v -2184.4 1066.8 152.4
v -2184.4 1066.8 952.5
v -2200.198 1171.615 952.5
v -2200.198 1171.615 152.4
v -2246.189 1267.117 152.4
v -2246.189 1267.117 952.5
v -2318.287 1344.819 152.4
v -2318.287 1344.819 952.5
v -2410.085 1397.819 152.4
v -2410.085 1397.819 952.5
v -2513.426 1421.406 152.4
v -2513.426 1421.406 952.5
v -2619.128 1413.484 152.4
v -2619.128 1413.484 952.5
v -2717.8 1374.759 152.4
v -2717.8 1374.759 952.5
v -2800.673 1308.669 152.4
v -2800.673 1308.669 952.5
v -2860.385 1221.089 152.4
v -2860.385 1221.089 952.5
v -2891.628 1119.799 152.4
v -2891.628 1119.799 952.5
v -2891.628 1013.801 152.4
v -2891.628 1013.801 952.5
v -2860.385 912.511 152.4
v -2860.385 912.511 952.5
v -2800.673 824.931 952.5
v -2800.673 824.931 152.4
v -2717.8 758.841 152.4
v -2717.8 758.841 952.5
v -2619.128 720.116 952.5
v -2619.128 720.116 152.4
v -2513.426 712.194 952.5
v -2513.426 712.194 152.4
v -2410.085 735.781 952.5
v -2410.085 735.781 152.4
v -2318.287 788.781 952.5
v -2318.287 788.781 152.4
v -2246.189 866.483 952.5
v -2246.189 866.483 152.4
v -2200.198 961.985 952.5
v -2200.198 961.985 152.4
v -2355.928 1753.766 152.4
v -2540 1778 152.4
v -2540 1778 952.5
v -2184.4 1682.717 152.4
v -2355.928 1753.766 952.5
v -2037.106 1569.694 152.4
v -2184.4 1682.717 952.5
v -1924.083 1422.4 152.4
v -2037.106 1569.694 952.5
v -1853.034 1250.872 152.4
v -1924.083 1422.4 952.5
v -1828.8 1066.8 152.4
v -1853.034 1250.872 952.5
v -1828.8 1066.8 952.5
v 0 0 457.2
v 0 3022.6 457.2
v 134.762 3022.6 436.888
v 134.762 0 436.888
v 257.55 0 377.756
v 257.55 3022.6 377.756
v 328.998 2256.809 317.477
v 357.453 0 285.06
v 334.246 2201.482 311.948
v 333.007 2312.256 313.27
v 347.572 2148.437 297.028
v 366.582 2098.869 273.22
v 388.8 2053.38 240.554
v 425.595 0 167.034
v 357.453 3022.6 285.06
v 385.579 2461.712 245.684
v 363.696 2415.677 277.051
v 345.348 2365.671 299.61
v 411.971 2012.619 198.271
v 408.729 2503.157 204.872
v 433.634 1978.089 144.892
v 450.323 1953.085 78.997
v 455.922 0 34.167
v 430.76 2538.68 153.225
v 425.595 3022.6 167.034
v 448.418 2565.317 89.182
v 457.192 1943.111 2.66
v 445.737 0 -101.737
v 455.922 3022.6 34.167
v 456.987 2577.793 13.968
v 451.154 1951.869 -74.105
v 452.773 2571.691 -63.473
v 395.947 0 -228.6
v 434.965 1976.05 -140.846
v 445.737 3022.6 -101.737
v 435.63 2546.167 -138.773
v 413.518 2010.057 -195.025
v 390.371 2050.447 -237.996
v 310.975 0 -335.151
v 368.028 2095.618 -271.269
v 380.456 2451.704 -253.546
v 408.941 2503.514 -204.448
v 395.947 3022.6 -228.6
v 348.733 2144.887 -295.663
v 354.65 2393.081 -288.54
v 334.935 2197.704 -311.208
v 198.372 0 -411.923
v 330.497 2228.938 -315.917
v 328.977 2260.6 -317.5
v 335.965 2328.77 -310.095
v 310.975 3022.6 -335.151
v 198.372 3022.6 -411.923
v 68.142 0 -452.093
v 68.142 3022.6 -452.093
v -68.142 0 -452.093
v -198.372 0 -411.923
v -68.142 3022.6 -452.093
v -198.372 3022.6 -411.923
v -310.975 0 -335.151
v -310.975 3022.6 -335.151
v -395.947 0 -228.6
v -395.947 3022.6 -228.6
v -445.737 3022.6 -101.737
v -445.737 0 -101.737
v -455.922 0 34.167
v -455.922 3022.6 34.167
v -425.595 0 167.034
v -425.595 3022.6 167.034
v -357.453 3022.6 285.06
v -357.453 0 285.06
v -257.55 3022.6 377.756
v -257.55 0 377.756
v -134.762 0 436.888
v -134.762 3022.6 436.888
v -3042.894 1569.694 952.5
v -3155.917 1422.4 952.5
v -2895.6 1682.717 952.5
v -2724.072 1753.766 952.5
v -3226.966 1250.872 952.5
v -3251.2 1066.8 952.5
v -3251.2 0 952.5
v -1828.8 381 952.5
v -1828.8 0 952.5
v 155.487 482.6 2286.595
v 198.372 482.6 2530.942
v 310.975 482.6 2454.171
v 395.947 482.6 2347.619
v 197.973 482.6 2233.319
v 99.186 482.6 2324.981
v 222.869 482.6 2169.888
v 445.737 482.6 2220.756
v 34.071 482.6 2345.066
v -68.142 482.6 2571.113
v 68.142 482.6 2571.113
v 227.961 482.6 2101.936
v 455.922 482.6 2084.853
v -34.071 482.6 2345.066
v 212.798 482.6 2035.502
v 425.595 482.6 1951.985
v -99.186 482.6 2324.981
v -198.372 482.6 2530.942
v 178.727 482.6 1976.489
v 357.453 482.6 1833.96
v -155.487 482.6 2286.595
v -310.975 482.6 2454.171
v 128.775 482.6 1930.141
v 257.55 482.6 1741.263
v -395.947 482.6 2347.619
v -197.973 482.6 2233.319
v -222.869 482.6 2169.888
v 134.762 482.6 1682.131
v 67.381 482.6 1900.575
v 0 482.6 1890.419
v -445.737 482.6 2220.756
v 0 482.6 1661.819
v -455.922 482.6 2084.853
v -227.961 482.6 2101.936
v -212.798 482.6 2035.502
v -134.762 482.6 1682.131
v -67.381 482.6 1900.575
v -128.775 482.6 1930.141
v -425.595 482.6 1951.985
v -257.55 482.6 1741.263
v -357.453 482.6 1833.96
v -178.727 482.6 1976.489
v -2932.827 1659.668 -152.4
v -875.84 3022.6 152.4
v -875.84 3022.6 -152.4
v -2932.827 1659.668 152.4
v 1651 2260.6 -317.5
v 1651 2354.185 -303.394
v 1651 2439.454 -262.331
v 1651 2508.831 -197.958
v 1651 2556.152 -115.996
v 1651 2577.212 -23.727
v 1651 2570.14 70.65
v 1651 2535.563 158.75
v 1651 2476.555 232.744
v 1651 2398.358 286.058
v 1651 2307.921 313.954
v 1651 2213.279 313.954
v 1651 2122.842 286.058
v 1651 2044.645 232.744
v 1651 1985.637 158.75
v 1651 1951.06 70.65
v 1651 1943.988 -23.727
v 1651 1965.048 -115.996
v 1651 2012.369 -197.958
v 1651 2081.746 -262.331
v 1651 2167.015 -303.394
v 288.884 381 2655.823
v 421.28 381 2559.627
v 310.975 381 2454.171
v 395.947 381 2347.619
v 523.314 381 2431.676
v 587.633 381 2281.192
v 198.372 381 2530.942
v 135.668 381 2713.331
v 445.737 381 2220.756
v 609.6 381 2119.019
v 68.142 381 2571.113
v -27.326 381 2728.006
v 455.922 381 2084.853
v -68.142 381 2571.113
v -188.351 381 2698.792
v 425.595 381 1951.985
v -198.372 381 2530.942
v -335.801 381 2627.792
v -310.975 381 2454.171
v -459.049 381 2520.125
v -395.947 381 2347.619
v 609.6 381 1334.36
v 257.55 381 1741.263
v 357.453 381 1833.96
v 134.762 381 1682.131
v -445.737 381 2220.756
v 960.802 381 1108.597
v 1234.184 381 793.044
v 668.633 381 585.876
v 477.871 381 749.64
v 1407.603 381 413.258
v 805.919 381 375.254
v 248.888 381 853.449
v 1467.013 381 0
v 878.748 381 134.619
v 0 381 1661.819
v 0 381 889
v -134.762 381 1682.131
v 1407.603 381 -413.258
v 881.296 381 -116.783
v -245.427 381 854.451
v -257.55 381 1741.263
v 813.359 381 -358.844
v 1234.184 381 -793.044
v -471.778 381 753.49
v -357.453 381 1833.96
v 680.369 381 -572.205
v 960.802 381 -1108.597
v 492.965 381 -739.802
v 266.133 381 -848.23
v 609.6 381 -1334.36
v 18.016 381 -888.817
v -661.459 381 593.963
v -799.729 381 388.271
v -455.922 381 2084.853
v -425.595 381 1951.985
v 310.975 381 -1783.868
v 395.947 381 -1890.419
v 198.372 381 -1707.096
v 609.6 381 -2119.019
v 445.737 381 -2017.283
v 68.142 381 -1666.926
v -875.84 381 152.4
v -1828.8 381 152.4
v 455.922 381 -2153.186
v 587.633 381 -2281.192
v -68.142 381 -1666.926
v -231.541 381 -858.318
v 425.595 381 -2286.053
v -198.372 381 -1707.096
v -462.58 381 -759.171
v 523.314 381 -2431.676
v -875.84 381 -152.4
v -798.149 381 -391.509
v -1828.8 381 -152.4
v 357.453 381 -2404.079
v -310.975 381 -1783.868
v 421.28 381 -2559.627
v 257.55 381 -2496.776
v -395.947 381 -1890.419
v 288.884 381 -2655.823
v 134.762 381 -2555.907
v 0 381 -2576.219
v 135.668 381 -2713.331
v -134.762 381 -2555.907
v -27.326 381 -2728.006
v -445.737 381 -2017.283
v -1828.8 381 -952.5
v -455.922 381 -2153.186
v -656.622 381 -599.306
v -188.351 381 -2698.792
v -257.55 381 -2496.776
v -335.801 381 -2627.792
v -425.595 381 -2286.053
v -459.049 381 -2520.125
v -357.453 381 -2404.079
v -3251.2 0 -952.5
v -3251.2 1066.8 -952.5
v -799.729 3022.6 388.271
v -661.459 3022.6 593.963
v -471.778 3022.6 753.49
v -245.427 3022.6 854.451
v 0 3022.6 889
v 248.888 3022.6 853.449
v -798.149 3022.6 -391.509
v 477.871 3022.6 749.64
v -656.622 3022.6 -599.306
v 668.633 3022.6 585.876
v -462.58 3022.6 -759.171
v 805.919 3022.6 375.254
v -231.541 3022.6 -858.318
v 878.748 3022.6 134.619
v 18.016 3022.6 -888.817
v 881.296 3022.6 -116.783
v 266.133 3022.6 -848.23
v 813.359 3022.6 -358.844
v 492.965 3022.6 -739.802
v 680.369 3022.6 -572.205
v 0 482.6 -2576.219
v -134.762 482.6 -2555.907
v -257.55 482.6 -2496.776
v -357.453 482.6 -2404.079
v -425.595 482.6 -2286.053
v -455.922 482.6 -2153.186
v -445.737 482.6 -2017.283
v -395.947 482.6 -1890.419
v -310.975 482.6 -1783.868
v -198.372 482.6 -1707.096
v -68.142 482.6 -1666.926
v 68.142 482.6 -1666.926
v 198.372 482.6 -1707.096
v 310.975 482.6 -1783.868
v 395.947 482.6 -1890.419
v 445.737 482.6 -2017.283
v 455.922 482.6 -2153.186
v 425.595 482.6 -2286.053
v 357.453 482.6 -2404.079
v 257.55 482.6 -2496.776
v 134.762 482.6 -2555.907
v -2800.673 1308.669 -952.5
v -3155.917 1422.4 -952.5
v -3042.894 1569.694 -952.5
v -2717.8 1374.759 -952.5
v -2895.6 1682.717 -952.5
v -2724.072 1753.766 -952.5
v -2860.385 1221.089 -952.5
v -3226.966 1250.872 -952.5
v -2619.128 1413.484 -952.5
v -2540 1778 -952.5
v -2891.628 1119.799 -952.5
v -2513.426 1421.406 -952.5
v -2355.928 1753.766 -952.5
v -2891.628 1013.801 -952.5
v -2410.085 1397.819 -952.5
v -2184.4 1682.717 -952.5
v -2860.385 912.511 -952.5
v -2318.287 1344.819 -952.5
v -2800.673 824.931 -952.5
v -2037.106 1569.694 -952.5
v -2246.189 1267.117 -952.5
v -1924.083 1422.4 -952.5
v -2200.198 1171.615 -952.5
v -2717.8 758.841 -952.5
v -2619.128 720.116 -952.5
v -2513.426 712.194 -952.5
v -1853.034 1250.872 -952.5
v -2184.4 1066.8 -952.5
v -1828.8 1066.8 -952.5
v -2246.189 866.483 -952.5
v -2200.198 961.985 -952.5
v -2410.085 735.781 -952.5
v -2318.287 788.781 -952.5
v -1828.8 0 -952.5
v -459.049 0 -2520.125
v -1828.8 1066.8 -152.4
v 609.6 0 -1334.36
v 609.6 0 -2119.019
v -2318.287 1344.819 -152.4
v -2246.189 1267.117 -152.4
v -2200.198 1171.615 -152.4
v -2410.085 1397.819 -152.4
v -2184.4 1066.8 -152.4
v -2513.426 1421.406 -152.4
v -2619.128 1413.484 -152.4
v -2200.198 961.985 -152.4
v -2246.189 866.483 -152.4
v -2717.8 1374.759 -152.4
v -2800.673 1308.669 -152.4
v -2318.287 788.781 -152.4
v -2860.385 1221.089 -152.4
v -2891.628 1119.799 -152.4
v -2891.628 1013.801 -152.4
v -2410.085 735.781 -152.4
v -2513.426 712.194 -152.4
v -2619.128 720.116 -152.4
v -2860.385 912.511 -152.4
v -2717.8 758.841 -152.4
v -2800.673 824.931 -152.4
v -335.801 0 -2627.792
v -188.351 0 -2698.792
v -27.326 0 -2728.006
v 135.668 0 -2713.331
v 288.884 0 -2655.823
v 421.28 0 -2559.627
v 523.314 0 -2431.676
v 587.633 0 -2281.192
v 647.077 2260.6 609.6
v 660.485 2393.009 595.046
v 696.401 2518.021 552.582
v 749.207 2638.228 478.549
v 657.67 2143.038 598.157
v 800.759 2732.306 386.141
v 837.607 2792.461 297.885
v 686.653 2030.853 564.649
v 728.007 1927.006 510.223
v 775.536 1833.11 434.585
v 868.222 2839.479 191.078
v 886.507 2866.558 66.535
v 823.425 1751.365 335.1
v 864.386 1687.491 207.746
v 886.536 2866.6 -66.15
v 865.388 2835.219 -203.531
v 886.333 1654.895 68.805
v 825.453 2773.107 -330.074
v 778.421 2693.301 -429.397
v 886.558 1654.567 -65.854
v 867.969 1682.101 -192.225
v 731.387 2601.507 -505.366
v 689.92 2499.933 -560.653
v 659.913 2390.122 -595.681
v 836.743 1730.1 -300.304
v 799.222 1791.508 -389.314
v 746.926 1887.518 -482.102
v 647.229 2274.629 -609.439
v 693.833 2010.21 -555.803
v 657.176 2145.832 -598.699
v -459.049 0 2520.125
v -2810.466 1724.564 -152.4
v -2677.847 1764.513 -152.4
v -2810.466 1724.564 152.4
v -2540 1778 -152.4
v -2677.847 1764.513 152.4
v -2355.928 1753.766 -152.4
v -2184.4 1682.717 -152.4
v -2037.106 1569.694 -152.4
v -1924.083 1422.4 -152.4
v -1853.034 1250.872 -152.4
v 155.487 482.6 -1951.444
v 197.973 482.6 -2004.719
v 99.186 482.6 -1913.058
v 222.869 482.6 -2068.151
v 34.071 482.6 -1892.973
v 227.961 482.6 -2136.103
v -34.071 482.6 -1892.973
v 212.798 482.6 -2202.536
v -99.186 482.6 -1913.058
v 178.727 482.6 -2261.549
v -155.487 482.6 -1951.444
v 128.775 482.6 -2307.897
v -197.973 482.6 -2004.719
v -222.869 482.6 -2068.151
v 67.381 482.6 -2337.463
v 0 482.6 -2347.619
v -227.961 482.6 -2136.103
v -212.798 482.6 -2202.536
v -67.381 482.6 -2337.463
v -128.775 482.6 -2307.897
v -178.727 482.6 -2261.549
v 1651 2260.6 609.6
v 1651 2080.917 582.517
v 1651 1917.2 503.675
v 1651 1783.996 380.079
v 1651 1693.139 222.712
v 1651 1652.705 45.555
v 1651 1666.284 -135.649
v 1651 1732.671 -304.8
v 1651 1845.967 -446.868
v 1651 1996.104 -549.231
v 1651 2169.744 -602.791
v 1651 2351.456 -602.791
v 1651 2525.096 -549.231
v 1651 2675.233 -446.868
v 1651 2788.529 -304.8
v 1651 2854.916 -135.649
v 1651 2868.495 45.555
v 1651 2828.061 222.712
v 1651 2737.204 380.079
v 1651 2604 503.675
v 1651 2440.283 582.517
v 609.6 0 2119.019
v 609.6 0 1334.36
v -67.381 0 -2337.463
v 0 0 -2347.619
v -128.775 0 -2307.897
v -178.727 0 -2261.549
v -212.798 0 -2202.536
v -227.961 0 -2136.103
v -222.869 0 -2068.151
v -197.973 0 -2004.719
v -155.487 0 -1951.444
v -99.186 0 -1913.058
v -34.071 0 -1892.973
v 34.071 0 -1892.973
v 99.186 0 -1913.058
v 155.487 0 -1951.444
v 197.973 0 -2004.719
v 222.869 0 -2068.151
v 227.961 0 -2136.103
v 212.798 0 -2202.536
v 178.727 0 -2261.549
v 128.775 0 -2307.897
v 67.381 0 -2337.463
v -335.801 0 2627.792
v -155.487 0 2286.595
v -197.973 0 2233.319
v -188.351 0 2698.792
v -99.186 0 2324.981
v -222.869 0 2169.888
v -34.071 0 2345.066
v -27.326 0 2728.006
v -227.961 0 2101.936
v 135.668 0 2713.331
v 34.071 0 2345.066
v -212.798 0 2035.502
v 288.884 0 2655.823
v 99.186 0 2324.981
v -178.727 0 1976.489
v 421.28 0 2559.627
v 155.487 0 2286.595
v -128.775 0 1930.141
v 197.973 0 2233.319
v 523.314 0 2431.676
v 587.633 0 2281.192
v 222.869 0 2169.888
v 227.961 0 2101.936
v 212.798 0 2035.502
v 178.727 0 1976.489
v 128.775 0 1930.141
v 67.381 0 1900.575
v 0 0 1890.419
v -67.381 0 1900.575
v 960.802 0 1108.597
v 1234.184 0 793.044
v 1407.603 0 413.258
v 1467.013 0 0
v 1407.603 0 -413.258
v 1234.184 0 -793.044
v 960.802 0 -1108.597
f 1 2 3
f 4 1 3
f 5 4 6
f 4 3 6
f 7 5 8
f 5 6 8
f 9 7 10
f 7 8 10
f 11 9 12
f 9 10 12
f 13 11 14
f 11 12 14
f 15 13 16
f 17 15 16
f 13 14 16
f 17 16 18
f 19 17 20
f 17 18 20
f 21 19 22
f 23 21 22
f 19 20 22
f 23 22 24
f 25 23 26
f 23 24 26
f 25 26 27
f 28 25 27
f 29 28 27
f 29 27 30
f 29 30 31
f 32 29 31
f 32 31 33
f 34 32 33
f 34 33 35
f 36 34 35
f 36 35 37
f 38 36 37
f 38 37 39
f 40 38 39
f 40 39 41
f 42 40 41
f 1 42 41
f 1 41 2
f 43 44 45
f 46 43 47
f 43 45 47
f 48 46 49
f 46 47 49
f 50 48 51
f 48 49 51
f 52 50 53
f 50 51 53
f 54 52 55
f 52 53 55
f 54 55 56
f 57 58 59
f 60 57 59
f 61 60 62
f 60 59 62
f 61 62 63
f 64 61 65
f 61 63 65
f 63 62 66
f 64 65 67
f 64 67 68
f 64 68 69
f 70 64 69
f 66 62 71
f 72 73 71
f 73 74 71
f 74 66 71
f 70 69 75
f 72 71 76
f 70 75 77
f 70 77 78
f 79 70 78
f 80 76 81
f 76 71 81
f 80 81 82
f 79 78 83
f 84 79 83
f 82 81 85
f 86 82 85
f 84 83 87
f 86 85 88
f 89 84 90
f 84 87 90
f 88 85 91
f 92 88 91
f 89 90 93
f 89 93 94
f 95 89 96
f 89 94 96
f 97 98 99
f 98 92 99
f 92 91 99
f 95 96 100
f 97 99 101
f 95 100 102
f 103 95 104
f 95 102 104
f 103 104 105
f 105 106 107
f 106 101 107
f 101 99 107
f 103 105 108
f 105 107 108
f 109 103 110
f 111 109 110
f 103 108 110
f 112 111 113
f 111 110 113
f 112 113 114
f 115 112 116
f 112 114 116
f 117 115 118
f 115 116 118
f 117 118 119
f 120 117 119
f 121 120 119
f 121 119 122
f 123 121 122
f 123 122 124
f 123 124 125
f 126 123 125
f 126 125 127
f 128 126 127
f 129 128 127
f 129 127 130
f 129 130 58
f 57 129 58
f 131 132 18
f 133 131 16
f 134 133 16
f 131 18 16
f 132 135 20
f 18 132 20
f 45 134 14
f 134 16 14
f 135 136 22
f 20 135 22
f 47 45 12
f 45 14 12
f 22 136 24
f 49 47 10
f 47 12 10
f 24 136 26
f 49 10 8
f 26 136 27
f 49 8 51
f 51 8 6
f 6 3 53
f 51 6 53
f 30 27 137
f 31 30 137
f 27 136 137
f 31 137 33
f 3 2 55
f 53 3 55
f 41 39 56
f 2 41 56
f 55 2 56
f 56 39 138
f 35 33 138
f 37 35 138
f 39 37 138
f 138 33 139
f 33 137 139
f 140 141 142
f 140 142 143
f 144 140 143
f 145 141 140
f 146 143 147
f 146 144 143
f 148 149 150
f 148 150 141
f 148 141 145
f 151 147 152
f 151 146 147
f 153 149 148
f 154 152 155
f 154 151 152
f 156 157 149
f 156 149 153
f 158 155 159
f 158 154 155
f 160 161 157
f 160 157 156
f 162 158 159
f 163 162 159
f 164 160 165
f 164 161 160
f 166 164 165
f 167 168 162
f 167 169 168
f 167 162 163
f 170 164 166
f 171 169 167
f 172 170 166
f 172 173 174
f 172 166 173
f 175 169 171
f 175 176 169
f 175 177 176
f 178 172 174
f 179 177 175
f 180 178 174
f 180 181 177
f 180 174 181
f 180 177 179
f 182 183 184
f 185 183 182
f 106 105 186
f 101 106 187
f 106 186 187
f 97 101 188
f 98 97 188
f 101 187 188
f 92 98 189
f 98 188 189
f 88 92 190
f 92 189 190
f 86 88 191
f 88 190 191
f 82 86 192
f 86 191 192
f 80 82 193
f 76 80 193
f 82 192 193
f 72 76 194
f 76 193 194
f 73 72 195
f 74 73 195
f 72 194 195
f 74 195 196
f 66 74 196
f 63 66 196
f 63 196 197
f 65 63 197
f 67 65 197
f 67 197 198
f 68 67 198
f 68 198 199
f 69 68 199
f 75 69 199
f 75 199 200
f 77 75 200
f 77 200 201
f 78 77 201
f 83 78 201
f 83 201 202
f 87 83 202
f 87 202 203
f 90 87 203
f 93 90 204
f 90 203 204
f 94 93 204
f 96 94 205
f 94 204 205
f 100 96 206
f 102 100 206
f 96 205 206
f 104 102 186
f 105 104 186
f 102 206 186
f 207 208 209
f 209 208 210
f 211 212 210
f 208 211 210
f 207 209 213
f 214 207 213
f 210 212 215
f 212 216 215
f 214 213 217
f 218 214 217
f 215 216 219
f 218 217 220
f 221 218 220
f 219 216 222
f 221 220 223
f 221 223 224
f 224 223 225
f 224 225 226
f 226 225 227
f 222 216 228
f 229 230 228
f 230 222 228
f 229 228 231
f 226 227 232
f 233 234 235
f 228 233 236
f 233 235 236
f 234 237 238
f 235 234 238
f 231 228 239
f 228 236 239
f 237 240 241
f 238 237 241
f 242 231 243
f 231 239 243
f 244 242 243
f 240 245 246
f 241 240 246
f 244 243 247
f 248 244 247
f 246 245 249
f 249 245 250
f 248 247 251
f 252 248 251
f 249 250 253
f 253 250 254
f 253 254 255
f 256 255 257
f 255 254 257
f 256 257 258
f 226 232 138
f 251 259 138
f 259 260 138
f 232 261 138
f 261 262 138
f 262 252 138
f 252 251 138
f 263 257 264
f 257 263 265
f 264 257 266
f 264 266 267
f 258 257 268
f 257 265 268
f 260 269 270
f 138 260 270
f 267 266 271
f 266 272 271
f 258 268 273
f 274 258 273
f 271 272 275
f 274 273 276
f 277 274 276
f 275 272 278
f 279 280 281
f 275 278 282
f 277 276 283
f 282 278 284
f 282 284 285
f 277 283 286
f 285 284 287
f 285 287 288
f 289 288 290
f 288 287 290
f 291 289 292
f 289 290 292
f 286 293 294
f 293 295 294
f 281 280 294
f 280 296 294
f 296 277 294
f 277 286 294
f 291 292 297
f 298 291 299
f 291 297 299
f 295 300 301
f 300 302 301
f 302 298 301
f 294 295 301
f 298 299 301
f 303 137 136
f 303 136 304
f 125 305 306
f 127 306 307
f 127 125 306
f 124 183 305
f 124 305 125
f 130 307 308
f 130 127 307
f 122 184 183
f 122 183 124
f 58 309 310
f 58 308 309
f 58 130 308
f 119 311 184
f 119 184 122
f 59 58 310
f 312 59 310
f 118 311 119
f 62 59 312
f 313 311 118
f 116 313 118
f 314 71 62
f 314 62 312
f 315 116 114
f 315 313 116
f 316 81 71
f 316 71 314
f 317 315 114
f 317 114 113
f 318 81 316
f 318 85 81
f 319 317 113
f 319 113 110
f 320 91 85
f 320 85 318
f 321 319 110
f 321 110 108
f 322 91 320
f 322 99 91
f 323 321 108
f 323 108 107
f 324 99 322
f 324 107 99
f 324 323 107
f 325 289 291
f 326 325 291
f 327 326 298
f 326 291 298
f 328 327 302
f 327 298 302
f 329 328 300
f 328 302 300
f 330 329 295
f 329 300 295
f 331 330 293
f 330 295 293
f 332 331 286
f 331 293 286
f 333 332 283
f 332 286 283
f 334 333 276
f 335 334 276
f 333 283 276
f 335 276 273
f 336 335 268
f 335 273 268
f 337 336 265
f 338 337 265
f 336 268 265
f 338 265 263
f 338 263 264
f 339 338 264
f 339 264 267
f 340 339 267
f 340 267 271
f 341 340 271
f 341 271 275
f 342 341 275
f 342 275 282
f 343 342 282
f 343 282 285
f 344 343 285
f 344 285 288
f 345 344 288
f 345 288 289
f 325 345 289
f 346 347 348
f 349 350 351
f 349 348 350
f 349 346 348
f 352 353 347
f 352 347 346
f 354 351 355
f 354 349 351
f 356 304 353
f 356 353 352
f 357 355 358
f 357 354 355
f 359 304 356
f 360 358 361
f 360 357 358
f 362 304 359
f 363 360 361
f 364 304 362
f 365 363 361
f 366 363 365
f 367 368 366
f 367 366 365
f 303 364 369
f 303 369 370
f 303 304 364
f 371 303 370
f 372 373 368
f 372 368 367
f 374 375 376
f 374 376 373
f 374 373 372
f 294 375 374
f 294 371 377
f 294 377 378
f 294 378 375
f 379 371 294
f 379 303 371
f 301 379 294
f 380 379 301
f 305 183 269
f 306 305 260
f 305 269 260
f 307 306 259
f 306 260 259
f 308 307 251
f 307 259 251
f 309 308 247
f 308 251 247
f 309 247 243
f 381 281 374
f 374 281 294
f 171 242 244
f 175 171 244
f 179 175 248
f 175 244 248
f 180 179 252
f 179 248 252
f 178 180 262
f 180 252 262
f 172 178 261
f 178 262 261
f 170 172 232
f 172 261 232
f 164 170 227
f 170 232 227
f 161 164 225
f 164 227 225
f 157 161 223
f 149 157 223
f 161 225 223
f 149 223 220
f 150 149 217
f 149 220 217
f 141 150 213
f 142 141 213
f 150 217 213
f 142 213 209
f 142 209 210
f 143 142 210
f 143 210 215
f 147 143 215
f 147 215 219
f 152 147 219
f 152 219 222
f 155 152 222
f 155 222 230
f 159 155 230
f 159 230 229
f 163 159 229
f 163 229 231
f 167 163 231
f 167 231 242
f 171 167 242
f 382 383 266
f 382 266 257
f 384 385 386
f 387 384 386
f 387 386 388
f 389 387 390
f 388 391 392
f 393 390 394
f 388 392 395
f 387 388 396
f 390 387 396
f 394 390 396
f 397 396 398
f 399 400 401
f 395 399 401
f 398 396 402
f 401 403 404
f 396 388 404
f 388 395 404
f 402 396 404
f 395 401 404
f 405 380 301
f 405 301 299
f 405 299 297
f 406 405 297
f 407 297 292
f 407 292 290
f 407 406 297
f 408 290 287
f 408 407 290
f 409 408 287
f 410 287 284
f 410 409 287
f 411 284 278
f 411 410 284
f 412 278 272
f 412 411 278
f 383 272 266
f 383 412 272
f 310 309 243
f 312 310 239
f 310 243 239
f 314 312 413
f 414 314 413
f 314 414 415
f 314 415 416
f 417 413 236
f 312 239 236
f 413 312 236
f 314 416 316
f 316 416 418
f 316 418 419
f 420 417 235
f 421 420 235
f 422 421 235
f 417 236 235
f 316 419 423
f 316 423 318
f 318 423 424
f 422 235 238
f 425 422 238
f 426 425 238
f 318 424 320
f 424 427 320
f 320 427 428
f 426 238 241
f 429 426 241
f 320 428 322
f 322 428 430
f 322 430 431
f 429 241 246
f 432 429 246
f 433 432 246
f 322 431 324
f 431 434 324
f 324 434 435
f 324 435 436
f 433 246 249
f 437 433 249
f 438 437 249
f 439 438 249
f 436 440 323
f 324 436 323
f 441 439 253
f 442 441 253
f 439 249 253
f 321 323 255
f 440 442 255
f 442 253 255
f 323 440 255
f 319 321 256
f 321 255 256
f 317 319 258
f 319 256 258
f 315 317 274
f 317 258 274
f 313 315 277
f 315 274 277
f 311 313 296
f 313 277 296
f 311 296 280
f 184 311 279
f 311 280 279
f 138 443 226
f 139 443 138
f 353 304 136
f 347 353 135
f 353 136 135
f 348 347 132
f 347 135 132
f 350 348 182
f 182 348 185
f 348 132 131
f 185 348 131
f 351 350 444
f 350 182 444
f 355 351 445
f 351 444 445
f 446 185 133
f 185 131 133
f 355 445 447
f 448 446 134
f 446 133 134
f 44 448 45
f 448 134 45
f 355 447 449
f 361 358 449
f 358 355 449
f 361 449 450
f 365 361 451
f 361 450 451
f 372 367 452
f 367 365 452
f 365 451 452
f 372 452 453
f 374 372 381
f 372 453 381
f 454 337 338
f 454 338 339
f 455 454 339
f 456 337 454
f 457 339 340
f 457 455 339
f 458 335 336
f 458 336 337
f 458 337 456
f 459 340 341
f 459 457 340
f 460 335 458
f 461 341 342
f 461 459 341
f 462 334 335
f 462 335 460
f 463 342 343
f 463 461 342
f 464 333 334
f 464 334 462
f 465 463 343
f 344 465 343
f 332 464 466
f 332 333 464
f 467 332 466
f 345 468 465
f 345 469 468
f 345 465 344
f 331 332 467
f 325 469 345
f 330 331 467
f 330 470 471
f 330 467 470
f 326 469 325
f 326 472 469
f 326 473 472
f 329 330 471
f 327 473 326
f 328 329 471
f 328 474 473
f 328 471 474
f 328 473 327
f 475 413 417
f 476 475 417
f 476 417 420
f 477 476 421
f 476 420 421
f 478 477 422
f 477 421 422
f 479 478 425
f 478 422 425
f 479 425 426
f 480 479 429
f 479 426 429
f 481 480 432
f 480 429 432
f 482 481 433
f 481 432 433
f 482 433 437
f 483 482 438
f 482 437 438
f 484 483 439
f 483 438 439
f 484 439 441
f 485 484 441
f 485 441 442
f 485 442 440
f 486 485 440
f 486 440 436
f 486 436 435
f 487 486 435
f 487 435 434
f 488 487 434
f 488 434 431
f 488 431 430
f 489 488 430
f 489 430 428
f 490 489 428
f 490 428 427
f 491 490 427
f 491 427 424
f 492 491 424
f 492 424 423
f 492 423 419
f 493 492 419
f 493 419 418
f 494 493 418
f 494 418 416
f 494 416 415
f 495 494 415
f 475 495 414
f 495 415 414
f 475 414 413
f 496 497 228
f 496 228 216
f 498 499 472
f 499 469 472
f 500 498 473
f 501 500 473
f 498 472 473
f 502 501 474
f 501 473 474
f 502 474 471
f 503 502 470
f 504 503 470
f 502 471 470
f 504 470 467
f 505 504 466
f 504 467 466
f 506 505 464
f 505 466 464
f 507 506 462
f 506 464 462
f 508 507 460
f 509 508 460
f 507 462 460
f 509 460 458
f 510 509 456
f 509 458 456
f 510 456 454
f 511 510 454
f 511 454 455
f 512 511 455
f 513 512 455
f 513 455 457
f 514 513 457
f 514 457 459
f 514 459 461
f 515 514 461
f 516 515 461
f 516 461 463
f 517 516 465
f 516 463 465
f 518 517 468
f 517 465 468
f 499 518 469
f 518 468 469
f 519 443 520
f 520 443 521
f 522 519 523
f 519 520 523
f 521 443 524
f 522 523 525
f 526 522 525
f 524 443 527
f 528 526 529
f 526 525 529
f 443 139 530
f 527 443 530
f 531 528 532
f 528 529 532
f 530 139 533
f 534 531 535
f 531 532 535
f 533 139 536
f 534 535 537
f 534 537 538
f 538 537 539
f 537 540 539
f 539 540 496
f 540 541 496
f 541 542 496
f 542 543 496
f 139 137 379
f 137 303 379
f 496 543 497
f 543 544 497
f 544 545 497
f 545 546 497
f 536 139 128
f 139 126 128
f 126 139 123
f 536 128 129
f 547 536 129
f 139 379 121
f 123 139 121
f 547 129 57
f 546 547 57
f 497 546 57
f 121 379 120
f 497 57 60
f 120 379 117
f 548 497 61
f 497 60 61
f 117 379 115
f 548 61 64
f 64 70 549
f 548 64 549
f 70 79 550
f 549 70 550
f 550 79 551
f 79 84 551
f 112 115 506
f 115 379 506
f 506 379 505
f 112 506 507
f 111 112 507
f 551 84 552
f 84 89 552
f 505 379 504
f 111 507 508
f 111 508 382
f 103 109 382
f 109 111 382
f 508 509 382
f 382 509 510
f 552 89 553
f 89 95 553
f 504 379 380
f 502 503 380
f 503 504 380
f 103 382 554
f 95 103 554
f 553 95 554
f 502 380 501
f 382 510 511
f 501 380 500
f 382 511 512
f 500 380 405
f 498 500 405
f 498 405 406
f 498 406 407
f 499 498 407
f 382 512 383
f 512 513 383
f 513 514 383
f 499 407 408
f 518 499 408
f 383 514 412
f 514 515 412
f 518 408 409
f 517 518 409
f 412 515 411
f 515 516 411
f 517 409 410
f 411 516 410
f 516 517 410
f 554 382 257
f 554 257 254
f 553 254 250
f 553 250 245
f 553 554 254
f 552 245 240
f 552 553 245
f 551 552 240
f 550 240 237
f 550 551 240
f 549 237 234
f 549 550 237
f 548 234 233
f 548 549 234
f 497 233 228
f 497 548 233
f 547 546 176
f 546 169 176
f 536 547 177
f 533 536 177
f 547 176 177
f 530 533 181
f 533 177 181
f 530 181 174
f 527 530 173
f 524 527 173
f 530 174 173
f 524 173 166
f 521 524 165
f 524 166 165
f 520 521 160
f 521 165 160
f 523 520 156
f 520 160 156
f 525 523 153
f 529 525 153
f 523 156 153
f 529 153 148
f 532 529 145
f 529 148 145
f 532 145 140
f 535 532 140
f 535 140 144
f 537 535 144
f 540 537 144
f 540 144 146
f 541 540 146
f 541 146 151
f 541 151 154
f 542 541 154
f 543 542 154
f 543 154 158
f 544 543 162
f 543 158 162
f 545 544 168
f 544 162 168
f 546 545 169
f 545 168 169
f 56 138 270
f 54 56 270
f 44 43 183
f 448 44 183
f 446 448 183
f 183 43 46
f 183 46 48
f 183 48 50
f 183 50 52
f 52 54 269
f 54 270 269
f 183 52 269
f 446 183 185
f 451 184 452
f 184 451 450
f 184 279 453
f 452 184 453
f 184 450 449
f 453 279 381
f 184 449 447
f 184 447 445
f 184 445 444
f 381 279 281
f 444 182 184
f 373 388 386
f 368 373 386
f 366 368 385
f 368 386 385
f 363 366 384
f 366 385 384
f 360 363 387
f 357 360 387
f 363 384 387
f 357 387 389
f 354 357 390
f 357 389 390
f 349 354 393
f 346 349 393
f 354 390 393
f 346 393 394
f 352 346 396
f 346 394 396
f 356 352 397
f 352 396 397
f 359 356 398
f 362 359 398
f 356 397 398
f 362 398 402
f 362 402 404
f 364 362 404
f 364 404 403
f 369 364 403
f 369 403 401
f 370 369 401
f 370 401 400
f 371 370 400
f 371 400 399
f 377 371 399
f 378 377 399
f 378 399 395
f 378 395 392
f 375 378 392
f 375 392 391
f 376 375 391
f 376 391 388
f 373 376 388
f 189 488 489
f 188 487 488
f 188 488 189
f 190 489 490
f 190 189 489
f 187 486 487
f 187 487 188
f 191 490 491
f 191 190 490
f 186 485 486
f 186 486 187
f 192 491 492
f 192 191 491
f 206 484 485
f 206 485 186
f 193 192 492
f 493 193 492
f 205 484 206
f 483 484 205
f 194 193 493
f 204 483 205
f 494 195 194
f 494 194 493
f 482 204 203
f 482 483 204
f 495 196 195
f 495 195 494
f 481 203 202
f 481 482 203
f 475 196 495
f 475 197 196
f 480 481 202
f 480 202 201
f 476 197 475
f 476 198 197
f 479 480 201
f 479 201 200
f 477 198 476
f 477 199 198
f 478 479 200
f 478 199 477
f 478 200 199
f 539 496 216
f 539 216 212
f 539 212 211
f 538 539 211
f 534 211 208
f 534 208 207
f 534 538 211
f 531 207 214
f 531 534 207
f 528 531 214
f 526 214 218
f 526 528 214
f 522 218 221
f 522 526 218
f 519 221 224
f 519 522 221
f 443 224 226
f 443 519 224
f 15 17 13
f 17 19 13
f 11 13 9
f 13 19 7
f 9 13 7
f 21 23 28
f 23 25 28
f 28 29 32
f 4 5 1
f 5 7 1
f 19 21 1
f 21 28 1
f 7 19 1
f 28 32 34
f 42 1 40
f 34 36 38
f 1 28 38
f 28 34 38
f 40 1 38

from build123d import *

# Parameters (mm, degrees)
BOSS_EXTRUDE1_DEPTH  = 381
SKETCH2_R            = 889
BOSS_EXTRUDE2_DEPTH  = 3022.6
SKETCH4_R            = 457.2
SKETCH4_R_2          = 228.6
BOSS_EXTRUDE3_DEPTH  = 482.6
CUT_EXTRUDE2_REACH   = 4217.201
SKETCH5_R            = 228.6
SKETCH6_R            = 609.6
BOSS_EXTRUDE4_DEPTH  = 1651
SKETCH7_R            = 317.5
CUT_EXTRUDE3_DEPTH   = 1651
SKETCH8_R            = 457.2
CUT_EXTRUDE4_DEPTH   = 3022.6
SKETCH10_W           = 1422.4
SKETCH10_H           = 1905
BOSS_EXTRUDE5_DEPTH  = 1778
CUT_EXTRUDE5_REACH   = 5768.893
CUT_EXTRUDE6_REACH   = 5768.893
SKETCH12_R           = 355.6
BOSS_EXTRUDE10_START = -3022.6
BOSS_EXTRUDE10_DEPTH = 3022.6
CUT_EXTRUDE7_REACH   = 5294.134


with BuildPart() as part:
    # Sketch1 → Boss-Extrude1 (new body)
    with BuildSketch(Plane(origin=(0, 0, 0), x_dir=(1, 0, 0), z_dir=(0, 1, 0))):
        with BuildLine():
            Line((609.6, 2119.019260313), (609.6, 1334.359757456))
            ThreePointArc((609.6, 1334.359757456), (1467.013334063, 0), (609.6, -1334.359757456))
            Line((609.6, -1334.359757456), (609.6, -2119.019260313))
            ThreePointArc((609.6, -2119.019260313), (214.2143917, -2689.741920095), (-459.049456656, -2520.124927618))
            Line((-459.049456656, -2520.124927618), (-1828.8, -952.5))
            Line((-1828.8, -952.5), (-1828.8, 952.5))
            Line((-1828.8, 952.5), (-459.049456656, 2520.124927618))
            ThreePointArc((-459.049456656, 2520.124927618), (214.2143917, 2689.741920095), (609.6, 2119.019260313))
        make_face()
    extrude(amount=BOSS_EXTRUDE1_DEPTH)

    # Sketch2 → Boss-Extrude2 (add)
    with BuildSketch(Plane(origin=(0, 0, 0), x_dir=(1, 0, 0), z_dir=(0, 1, 0))):
        with Locations(Location((0, 0, 0), (0, 0, 270))):
            Circle(SKETCH2_R)
    extrude(amount=BOSS_EXTRUDE2_DEPTH)

    # Sketch4 → Boss-Extrude3 (add)
    # profile 1 of 2: a face of its own
    with BuildSketch(Plane(origin=(0, 0, 0), x_dir=(1, 0, 0), z_dir=(0, 1, 0))):
        with Locations(Location((0, -2119.019260313, 0), (0, 0, 90))):
            Circle(SKETCH4_R)
        with Locations(Location((0, -2119.019260313, 0), (0, 0, 90))):
            Circle(SKETCH4_R_2, mode=Mode.SUBTRACT)
    # profile 2 of 2: a face of its own
    with BuildSketch(Plane(origin=(0, 0, 0), x_dir=(1, 0, 0), z_dir=(0, 1, 0))):
        with Locations(Location((0, 2119.019260313, 0), (0, 0, 90))):
            Circle(SKETCH4_R)
        with Locations(Location((0, 2119.019260313, 0), (0, 0, 90))):
            Circle(SKETCH4_R_2, mode=Mode.SUBTRACT)
    extrude(amount=BOSS_EXTRUDE3_DEPTH)

    # Sketch5 → Cut-Extrude2 (cut, up to next)
    with BuildSketch(Plane(origin=(0, 381, 0), x_dir=(1, 0, 0), z_dir=(0, 1, 0)), mode=Mode.PRIVATE) as cut_extrude2_sk1:
        with Locations(Location((0, 2119.019260313, 0), (0, 0, 90))):
            Circle(SKETCH5_R)
    cut_extrude2_tool1 = extrude(cut_extrude2_sk1.sketch, amount=-CUT_EXTRUDE2_REACH, mode=Mode.PRIVATE) & part.part
    # Sketch5 → Cut-Extrude2 (cut, up to next)
    with BuildSketch(Plane(origin=(0, 381, 0), x_dir=(1, 0, 0), z_dir=(0, 1, 0)), mode=Mode.PRIVATE) as cut_extrude2_sk2:
        with Locations(Location((0, -2119.019260313, 0), (0, 0, 90))):
            Circle(SKETCH5_R)
    cut_extrude2_tool2 = extrude(cut_extrude2_sk2.sketch, amount=-CUT_EXTRUDE2_REACH, mode=Mode.PRIVATE) & part.part
    add(cut_extrude2_tool1.solids().sort_by_distance((0, 381, -2119.01926))[0], mode=Mode.SUBTRACT)
    add(cut_extrude2_tool2.solids().sort_by_distance((0, 381, 2119.01926))[0], mode=Mode.SUBTRACT)

    # Sketch6 → Boss-Extrude4 (add)
    with BuildSketch(Plane(origin=(0, 0, 0), x_dir=(0, 0, -1), z_dir=(1, 0, 0))):
        with Locations(Location((0, 2260.6, 0), (0, 0, 180))):
            Circle(SKETCH6_R)
    extrude(amount=BOSS_EXTRUDE4_DEPTH)

    # Sketch7 → Cut-Extrude3 (cut)
    with BuildSketch(Plane(origin=(1651, 0, 0), x_dir=(0, 0, -1), z_dir=(1, 0, 0))):
        with Locations((0, 2260.6)):
            Circle(SKETCH7_R)
    extrude(amount=-CUT_EXTRUDE3_DEPTH, mode=Mode.SUBTRACT)

    # Sketch8 → Cut-Extrude4 (cut)
    with BuildSketch(Plane(origin=(0, 3022.6, 0), x_dir=(1, 0, 0), z_dir=(0, 1, 0))):
        with Locations(Location((0, 0, 0), (0, 0, 270))):
            Circle(SKETCH8_R)
    extrude(amount=-CUT_EXTRUDE4_DEPTH, mode=Mode.SUBTRACT)

    # Sketch10 → Boss-Extrude5 (add)
    with BuildSketch(Plane(origin=(0, 0, 0), x_dir=(1, 0, 0), z_dir=(0, 1, 0))):
        with Locations((-2540, 0)):
            Rectangle(SKETCH10_W, SKETCH10_H)
    extrude(amount=BOSS_EXTRUDE5_DEPTH)

    # Sketch11 → Cut-Extrude5 (cut, up to next)
    with BuildSketch(Plane.XY.offset(952.5), mode=Mode.PRIVATE) as cut_extrude5_sk1:
        with BuildLine():
            Line((-3251.2, 1778), (-3251.2, 1066.8))
            ThreePointArc((-3251.2, 1066.8), (-3042.89434278, 1569.69434278), (-2540, 1778))
            Line((-2540, 1778), (-3251.2, 1778))
        make_face()
    cut_extrude5_tool1 = extrude(cut_extrude5_sk1.sketch, amount=-CUT_EXTRUDE5_REACH, mode=Mode.PRIVATE) & part.part
    # Sketch11 → Cut-Extrude5 (cut, up to next)
    with BuildSketch(Plane.XY.offset(952.5), mode=Mode.PRIVATE) as cut_extrude5_sk2:
        with BuildLine():
            Line((-1828.8, 1778), (-2540, 1778))
            ThreePointArc((-2540, 1778), (-2037.10565722, 1569.69434278), (-1828.8, 1066.8))
            Line((-1828.8, 1066.8), (-1828.8, 1778))
        make_face()
    cut_extrude5_tool2 = extrude(cut_extrude5_sk2.sketch, amount=-CUT_EXTRUDE5_REACH, mode=Mode.PRIVATE) & part.part
    add(cut_extrude5_tool1.solids().sort_by_distance((-3092.340722, 1619.140722, 952.5))[0], mode=Mode.SUBTRACT)
    add(cut_extrude5_tool2.solids().sort_by_distance((-1987.659278, 1619.140722, 952.5))[0], mode=Mode.SUBTRACT)

    # Sketch12 → Cut-Extrude6 (cut, up to next)
    with BuildSketch(Plane.XY.offset(952.5), mode=Mode.PRIVATE) as cut_extrude6_sk1:
        with Locations((-2540, 1066.8)):
            Circle(SKETCH12_R)
    cut_extrude6_tool1 = extrude(cut_extrude6_sk1.sketch, amount=-CUT_EXTRUDE6_REACH, mode=Mode.PRIVATE) & part.part
    add(cut_extrude6_tool1.solids().sort_by_distance((-2540, 1066.8, 952.5))[0], mode=Mode.SUBTRACT)

    # Sketch15 → Boss-Extrude10 (add)
    with BuildSketch(Plane(origin=(0, 3022.6, 0), x_dir=(1, 0, 0), z_dir=(0, 1, 0)).offset(BOSS_EXTRUDE10_START)):
        with BuildLine():
            Line((-875.839734198, 152.4), (-3251.2, 152.4))
            Line((-3251.2, 152.4), (-3251.2, -152.4))
            Line((-3251.2, -152.4), (-875.839734198, -152.4))
            ThreePointArc((-875.839734198, -152.4), (-889, 0), (-875.839734198, 152.4))
        make_face()
    extrude(amount=BOSS_EXTRUDE10_DEPTH)

    # Sketch16 → Cut-Extrude7 (cut, up to next)
    with BuildSketch(Plane.XY.offset(152.4), mode=Mode.PRIVATE) as cut_extrude7_sk1:
        with BuildLine():
            Line((-875.839734198, 3022.6), (-2932.826520859, 1659.668252236))
            ThreePointArc((-2932.826520859, 1659.668252236), (-3166.571488992, 1403.272300765), (-3251.2, 1066.8))
            Line((-3251.2, 1066.8), (-3251.2, 3022.6))
            Line((-3251.2, 3022.6), (-875.839734198, 3022.6))
        make_face()
    cut_extrude7_tool1 = extrude(cut_extrude7_sk1.sketch, amount=-CUT_EXTRUDE7_REACH, mode=Mode.PRIVATE) & part.part
    add(cut_extrude7_tool1.solids().sort_by_distance((-2467.984815, 2485.152137, 152.4))[0], mode=Mode.SUBTRACT)


solid = part.part
